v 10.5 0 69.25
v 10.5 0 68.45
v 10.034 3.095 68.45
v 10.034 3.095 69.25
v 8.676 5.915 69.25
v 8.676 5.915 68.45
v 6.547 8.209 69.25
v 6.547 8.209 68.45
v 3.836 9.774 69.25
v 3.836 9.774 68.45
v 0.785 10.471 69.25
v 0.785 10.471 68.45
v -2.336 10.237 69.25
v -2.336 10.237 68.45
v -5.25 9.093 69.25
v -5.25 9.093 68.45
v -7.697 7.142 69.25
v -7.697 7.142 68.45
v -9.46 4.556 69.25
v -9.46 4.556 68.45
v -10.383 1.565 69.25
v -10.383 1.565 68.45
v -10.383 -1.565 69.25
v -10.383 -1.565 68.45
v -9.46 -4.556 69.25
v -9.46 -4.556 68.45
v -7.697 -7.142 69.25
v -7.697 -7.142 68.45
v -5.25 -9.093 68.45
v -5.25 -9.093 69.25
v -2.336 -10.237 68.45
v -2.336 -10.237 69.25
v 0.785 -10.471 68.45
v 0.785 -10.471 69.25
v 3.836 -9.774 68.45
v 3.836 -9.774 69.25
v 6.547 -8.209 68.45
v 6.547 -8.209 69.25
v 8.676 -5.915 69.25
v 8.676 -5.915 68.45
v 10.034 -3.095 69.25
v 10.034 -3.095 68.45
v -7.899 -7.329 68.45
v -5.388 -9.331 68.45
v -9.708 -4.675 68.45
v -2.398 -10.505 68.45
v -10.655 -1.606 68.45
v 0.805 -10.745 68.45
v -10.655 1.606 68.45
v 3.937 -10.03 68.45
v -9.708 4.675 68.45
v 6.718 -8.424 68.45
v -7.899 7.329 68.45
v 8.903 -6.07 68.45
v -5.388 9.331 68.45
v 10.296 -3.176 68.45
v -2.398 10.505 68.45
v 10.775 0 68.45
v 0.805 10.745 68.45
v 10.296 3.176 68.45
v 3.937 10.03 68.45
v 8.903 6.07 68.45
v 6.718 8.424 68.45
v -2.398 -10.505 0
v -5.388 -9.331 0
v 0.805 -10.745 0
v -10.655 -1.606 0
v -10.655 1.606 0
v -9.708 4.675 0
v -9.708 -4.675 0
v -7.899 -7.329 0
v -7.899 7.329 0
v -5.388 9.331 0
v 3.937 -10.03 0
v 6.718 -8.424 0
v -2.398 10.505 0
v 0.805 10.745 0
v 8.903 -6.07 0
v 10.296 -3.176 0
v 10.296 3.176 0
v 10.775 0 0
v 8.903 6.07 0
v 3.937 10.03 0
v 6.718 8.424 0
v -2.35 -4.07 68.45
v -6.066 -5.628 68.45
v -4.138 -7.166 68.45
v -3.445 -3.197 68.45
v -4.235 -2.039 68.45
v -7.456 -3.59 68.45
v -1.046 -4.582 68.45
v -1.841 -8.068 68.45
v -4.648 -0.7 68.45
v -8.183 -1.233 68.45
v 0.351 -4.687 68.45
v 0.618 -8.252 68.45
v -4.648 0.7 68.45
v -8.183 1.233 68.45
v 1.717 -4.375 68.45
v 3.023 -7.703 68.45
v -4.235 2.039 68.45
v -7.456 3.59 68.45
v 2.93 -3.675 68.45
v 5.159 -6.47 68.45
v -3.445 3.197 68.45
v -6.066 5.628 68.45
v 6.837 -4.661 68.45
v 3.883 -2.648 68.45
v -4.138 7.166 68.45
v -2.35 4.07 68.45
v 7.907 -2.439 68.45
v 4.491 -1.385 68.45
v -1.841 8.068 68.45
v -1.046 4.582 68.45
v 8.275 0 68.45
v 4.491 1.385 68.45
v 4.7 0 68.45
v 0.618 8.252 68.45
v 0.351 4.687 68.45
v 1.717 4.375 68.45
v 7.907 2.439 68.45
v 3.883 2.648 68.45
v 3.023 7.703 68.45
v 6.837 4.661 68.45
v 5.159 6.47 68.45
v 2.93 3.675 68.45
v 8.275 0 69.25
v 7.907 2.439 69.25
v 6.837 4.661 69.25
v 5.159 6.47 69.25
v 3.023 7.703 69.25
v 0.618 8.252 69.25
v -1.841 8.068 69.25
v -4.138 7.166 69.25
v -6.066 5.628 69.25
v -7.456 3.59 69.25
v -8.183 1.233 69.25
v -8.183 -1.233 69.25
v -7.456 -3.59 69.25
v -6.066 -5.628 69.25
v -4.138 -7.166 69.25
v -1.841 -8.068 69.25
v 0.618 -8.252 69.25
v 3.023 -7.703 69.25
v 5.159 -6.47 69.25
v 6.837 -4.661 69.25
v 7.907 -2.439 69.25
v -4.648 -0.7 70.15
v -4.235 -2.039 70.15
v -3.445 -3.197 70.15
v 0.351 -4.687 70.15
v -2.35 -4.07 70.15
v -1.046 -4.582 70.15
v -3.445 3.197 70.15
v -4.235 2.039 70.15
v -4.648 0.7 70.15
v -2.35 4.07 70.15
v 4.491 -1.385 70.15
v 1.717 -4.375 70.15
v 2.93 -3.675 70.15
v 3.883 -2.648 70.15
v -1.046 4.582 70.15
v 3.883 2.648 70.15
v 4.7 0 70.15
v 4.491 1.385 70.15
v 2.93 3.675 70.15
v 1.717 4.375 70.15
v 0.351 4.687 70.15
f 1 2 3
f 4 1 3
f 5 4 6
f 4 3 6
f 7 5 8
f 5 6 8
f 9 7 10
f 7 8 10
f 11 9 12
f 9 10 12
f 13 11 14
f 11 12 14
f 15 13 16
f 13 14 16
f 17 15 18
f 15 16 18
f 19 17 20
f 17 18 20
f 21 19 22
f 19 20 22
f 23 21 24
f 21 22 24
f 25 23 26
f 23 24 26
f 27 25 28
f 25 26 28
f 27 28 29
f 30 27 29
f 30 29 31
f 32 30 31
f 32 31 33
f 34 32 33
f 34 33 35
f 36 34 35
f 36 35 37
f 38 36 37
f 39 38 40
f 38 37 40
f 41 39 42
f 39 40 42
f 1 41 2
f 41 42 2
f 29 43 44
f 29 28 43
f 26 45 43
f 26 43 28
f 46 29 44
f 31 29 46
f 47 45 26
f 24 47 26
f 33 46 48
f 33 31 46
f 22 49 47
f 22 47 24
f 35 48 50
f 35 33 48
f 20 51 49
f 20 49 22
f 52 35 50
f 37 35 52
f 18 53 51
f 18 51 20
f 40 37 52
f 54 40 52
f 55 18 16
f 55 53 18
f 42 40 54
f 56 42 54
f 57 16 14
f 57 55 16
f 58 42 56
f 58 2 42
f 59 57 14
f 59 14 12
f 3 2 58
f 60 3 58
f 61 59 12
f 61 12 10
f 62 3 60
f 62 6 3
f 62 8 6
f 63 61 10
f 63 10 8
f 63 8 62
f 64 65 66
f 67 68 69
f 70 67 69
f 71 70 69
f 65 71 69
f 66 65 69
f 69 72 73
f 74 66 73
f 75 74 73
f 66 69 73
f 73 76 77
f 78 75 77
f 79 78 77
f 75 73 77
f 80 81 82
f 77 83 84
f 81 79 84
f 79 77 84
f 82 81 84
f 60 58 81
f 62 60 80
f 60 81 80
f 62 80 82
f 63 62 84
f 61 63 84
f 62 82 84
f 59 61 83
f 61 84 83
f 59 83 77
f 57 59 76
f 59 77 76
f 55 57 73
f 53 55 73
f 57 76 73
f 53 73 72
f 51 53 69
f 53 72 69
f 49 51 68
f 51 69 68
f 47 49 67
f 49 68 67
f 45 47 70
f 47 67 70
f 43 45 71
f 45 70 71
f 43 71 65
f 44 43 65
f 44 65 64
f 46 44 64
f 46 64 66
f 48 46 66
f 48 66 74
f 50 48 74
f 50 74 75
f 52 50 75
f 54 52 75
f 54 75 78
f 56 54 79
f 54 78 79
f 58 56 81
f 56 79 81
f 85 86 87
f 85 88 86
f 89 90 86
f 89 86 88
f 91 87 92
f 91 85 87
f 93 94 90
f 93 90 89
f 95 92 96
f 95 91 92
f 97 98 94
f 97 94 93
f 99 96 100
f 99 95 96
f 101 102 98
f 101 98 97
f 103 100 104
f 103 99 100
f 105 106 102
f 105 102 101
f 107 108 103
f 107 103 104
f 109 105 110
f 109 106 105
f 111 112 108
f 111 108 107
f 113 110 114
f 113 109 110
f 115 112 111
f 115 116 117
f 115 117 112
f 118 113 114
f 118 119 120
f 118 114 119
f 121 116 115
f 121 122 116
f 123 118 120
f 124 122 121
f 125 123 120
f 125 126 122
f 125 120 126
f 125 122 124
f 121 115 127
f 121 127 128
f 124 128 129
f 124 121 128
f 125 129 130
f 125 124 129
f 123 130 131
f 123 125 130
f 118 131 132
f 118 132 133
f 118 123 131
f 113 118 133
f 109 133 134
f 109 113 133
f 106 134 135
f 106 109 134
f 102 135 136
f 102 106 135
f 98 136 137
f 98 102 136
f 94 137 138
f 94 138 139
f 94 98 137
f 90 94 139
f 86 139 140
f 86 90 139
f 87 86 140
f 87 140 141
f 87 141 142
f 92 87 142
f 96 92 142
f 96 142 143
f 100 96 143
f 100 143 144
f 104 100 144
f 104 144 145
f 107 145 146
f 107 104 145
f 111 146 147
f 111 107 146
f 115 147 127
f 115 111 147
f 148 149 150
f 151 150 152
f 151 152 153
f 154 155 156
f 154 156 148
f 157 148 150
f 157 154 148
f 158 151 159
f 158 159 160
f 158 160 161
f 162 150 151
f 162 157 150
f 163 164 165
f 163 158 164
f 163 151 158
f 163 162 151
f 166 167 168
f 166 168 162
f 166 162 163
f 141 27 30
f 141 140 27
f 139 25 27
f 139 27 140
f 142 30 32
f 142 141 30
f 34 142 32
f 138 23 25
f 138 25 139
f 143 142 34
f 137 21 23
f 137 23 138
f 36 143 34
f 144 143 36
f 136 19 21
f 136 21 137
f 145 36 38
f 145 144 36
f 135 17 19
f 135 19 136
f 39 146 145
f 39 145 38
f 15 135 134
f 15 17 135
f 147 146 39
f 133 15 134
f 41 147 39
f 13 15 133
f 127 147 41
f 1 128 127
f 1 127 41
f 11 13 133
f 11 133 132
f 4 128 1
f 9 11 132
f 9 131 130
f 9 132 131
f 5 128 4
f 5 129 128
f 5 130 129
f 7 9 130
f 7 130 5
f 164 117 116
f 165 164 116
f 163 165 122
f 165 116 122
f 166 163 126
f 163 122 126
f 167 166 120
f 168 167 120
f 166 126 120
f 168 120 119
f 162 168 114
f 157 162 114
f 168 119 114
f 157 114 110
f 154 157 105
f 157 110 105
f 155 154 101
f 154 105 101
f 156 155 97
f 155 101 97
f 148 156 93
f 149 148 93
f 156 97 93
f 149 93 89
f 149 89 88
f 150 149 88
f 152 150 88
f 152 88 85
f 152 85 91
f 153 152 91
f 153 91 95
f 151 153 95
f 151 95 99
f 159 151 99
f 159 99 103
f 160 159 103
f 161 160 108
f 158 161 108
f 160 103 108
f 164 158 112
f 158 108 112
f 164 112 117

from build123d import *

# Parameters (mm, degrees)
SKETCH1_R           = 10.775
BOSS_EXTRUDE1_DEPTH = 68.45
SKETCH2_R           = 4.7
BOSS_EXTRUDE2_DEPTH = 1.7
SKETCH3_R           = 10.5
SKETCH3_R_2         = 8.275
BOSS_EXTRUDE3_DEPTH = 0.8


with BuildPart() as part:
    # Sketch1 → Boss-Extrude1 (new body)
    with BuildSketch(Plane.XY):
        Circle(SKETCH1_R)
    extrude(amount=BOSS_EXTRUDE1_DEPTH)

    # Sketch2 → Boss-Extrude2 (add)
    with BuildSketch(Plane.XY.offset(68.45)):
        Circle(SKETCH2_R)
    extrude(amount=BOSS_EXTRUDE2_DEPTH)

    # Sketch3 → Boss-Extrude3 (add)
    with BuildSketch(Plane.XY.offset(68.45)):
        Circle(SKETCH3_R)
        Circle(SKETCH3_R_2, mode=Mode.SUBTRACT)
    extrude(amount=BOSS_EXTRUDE3_DEPTH)


solid = part.part
